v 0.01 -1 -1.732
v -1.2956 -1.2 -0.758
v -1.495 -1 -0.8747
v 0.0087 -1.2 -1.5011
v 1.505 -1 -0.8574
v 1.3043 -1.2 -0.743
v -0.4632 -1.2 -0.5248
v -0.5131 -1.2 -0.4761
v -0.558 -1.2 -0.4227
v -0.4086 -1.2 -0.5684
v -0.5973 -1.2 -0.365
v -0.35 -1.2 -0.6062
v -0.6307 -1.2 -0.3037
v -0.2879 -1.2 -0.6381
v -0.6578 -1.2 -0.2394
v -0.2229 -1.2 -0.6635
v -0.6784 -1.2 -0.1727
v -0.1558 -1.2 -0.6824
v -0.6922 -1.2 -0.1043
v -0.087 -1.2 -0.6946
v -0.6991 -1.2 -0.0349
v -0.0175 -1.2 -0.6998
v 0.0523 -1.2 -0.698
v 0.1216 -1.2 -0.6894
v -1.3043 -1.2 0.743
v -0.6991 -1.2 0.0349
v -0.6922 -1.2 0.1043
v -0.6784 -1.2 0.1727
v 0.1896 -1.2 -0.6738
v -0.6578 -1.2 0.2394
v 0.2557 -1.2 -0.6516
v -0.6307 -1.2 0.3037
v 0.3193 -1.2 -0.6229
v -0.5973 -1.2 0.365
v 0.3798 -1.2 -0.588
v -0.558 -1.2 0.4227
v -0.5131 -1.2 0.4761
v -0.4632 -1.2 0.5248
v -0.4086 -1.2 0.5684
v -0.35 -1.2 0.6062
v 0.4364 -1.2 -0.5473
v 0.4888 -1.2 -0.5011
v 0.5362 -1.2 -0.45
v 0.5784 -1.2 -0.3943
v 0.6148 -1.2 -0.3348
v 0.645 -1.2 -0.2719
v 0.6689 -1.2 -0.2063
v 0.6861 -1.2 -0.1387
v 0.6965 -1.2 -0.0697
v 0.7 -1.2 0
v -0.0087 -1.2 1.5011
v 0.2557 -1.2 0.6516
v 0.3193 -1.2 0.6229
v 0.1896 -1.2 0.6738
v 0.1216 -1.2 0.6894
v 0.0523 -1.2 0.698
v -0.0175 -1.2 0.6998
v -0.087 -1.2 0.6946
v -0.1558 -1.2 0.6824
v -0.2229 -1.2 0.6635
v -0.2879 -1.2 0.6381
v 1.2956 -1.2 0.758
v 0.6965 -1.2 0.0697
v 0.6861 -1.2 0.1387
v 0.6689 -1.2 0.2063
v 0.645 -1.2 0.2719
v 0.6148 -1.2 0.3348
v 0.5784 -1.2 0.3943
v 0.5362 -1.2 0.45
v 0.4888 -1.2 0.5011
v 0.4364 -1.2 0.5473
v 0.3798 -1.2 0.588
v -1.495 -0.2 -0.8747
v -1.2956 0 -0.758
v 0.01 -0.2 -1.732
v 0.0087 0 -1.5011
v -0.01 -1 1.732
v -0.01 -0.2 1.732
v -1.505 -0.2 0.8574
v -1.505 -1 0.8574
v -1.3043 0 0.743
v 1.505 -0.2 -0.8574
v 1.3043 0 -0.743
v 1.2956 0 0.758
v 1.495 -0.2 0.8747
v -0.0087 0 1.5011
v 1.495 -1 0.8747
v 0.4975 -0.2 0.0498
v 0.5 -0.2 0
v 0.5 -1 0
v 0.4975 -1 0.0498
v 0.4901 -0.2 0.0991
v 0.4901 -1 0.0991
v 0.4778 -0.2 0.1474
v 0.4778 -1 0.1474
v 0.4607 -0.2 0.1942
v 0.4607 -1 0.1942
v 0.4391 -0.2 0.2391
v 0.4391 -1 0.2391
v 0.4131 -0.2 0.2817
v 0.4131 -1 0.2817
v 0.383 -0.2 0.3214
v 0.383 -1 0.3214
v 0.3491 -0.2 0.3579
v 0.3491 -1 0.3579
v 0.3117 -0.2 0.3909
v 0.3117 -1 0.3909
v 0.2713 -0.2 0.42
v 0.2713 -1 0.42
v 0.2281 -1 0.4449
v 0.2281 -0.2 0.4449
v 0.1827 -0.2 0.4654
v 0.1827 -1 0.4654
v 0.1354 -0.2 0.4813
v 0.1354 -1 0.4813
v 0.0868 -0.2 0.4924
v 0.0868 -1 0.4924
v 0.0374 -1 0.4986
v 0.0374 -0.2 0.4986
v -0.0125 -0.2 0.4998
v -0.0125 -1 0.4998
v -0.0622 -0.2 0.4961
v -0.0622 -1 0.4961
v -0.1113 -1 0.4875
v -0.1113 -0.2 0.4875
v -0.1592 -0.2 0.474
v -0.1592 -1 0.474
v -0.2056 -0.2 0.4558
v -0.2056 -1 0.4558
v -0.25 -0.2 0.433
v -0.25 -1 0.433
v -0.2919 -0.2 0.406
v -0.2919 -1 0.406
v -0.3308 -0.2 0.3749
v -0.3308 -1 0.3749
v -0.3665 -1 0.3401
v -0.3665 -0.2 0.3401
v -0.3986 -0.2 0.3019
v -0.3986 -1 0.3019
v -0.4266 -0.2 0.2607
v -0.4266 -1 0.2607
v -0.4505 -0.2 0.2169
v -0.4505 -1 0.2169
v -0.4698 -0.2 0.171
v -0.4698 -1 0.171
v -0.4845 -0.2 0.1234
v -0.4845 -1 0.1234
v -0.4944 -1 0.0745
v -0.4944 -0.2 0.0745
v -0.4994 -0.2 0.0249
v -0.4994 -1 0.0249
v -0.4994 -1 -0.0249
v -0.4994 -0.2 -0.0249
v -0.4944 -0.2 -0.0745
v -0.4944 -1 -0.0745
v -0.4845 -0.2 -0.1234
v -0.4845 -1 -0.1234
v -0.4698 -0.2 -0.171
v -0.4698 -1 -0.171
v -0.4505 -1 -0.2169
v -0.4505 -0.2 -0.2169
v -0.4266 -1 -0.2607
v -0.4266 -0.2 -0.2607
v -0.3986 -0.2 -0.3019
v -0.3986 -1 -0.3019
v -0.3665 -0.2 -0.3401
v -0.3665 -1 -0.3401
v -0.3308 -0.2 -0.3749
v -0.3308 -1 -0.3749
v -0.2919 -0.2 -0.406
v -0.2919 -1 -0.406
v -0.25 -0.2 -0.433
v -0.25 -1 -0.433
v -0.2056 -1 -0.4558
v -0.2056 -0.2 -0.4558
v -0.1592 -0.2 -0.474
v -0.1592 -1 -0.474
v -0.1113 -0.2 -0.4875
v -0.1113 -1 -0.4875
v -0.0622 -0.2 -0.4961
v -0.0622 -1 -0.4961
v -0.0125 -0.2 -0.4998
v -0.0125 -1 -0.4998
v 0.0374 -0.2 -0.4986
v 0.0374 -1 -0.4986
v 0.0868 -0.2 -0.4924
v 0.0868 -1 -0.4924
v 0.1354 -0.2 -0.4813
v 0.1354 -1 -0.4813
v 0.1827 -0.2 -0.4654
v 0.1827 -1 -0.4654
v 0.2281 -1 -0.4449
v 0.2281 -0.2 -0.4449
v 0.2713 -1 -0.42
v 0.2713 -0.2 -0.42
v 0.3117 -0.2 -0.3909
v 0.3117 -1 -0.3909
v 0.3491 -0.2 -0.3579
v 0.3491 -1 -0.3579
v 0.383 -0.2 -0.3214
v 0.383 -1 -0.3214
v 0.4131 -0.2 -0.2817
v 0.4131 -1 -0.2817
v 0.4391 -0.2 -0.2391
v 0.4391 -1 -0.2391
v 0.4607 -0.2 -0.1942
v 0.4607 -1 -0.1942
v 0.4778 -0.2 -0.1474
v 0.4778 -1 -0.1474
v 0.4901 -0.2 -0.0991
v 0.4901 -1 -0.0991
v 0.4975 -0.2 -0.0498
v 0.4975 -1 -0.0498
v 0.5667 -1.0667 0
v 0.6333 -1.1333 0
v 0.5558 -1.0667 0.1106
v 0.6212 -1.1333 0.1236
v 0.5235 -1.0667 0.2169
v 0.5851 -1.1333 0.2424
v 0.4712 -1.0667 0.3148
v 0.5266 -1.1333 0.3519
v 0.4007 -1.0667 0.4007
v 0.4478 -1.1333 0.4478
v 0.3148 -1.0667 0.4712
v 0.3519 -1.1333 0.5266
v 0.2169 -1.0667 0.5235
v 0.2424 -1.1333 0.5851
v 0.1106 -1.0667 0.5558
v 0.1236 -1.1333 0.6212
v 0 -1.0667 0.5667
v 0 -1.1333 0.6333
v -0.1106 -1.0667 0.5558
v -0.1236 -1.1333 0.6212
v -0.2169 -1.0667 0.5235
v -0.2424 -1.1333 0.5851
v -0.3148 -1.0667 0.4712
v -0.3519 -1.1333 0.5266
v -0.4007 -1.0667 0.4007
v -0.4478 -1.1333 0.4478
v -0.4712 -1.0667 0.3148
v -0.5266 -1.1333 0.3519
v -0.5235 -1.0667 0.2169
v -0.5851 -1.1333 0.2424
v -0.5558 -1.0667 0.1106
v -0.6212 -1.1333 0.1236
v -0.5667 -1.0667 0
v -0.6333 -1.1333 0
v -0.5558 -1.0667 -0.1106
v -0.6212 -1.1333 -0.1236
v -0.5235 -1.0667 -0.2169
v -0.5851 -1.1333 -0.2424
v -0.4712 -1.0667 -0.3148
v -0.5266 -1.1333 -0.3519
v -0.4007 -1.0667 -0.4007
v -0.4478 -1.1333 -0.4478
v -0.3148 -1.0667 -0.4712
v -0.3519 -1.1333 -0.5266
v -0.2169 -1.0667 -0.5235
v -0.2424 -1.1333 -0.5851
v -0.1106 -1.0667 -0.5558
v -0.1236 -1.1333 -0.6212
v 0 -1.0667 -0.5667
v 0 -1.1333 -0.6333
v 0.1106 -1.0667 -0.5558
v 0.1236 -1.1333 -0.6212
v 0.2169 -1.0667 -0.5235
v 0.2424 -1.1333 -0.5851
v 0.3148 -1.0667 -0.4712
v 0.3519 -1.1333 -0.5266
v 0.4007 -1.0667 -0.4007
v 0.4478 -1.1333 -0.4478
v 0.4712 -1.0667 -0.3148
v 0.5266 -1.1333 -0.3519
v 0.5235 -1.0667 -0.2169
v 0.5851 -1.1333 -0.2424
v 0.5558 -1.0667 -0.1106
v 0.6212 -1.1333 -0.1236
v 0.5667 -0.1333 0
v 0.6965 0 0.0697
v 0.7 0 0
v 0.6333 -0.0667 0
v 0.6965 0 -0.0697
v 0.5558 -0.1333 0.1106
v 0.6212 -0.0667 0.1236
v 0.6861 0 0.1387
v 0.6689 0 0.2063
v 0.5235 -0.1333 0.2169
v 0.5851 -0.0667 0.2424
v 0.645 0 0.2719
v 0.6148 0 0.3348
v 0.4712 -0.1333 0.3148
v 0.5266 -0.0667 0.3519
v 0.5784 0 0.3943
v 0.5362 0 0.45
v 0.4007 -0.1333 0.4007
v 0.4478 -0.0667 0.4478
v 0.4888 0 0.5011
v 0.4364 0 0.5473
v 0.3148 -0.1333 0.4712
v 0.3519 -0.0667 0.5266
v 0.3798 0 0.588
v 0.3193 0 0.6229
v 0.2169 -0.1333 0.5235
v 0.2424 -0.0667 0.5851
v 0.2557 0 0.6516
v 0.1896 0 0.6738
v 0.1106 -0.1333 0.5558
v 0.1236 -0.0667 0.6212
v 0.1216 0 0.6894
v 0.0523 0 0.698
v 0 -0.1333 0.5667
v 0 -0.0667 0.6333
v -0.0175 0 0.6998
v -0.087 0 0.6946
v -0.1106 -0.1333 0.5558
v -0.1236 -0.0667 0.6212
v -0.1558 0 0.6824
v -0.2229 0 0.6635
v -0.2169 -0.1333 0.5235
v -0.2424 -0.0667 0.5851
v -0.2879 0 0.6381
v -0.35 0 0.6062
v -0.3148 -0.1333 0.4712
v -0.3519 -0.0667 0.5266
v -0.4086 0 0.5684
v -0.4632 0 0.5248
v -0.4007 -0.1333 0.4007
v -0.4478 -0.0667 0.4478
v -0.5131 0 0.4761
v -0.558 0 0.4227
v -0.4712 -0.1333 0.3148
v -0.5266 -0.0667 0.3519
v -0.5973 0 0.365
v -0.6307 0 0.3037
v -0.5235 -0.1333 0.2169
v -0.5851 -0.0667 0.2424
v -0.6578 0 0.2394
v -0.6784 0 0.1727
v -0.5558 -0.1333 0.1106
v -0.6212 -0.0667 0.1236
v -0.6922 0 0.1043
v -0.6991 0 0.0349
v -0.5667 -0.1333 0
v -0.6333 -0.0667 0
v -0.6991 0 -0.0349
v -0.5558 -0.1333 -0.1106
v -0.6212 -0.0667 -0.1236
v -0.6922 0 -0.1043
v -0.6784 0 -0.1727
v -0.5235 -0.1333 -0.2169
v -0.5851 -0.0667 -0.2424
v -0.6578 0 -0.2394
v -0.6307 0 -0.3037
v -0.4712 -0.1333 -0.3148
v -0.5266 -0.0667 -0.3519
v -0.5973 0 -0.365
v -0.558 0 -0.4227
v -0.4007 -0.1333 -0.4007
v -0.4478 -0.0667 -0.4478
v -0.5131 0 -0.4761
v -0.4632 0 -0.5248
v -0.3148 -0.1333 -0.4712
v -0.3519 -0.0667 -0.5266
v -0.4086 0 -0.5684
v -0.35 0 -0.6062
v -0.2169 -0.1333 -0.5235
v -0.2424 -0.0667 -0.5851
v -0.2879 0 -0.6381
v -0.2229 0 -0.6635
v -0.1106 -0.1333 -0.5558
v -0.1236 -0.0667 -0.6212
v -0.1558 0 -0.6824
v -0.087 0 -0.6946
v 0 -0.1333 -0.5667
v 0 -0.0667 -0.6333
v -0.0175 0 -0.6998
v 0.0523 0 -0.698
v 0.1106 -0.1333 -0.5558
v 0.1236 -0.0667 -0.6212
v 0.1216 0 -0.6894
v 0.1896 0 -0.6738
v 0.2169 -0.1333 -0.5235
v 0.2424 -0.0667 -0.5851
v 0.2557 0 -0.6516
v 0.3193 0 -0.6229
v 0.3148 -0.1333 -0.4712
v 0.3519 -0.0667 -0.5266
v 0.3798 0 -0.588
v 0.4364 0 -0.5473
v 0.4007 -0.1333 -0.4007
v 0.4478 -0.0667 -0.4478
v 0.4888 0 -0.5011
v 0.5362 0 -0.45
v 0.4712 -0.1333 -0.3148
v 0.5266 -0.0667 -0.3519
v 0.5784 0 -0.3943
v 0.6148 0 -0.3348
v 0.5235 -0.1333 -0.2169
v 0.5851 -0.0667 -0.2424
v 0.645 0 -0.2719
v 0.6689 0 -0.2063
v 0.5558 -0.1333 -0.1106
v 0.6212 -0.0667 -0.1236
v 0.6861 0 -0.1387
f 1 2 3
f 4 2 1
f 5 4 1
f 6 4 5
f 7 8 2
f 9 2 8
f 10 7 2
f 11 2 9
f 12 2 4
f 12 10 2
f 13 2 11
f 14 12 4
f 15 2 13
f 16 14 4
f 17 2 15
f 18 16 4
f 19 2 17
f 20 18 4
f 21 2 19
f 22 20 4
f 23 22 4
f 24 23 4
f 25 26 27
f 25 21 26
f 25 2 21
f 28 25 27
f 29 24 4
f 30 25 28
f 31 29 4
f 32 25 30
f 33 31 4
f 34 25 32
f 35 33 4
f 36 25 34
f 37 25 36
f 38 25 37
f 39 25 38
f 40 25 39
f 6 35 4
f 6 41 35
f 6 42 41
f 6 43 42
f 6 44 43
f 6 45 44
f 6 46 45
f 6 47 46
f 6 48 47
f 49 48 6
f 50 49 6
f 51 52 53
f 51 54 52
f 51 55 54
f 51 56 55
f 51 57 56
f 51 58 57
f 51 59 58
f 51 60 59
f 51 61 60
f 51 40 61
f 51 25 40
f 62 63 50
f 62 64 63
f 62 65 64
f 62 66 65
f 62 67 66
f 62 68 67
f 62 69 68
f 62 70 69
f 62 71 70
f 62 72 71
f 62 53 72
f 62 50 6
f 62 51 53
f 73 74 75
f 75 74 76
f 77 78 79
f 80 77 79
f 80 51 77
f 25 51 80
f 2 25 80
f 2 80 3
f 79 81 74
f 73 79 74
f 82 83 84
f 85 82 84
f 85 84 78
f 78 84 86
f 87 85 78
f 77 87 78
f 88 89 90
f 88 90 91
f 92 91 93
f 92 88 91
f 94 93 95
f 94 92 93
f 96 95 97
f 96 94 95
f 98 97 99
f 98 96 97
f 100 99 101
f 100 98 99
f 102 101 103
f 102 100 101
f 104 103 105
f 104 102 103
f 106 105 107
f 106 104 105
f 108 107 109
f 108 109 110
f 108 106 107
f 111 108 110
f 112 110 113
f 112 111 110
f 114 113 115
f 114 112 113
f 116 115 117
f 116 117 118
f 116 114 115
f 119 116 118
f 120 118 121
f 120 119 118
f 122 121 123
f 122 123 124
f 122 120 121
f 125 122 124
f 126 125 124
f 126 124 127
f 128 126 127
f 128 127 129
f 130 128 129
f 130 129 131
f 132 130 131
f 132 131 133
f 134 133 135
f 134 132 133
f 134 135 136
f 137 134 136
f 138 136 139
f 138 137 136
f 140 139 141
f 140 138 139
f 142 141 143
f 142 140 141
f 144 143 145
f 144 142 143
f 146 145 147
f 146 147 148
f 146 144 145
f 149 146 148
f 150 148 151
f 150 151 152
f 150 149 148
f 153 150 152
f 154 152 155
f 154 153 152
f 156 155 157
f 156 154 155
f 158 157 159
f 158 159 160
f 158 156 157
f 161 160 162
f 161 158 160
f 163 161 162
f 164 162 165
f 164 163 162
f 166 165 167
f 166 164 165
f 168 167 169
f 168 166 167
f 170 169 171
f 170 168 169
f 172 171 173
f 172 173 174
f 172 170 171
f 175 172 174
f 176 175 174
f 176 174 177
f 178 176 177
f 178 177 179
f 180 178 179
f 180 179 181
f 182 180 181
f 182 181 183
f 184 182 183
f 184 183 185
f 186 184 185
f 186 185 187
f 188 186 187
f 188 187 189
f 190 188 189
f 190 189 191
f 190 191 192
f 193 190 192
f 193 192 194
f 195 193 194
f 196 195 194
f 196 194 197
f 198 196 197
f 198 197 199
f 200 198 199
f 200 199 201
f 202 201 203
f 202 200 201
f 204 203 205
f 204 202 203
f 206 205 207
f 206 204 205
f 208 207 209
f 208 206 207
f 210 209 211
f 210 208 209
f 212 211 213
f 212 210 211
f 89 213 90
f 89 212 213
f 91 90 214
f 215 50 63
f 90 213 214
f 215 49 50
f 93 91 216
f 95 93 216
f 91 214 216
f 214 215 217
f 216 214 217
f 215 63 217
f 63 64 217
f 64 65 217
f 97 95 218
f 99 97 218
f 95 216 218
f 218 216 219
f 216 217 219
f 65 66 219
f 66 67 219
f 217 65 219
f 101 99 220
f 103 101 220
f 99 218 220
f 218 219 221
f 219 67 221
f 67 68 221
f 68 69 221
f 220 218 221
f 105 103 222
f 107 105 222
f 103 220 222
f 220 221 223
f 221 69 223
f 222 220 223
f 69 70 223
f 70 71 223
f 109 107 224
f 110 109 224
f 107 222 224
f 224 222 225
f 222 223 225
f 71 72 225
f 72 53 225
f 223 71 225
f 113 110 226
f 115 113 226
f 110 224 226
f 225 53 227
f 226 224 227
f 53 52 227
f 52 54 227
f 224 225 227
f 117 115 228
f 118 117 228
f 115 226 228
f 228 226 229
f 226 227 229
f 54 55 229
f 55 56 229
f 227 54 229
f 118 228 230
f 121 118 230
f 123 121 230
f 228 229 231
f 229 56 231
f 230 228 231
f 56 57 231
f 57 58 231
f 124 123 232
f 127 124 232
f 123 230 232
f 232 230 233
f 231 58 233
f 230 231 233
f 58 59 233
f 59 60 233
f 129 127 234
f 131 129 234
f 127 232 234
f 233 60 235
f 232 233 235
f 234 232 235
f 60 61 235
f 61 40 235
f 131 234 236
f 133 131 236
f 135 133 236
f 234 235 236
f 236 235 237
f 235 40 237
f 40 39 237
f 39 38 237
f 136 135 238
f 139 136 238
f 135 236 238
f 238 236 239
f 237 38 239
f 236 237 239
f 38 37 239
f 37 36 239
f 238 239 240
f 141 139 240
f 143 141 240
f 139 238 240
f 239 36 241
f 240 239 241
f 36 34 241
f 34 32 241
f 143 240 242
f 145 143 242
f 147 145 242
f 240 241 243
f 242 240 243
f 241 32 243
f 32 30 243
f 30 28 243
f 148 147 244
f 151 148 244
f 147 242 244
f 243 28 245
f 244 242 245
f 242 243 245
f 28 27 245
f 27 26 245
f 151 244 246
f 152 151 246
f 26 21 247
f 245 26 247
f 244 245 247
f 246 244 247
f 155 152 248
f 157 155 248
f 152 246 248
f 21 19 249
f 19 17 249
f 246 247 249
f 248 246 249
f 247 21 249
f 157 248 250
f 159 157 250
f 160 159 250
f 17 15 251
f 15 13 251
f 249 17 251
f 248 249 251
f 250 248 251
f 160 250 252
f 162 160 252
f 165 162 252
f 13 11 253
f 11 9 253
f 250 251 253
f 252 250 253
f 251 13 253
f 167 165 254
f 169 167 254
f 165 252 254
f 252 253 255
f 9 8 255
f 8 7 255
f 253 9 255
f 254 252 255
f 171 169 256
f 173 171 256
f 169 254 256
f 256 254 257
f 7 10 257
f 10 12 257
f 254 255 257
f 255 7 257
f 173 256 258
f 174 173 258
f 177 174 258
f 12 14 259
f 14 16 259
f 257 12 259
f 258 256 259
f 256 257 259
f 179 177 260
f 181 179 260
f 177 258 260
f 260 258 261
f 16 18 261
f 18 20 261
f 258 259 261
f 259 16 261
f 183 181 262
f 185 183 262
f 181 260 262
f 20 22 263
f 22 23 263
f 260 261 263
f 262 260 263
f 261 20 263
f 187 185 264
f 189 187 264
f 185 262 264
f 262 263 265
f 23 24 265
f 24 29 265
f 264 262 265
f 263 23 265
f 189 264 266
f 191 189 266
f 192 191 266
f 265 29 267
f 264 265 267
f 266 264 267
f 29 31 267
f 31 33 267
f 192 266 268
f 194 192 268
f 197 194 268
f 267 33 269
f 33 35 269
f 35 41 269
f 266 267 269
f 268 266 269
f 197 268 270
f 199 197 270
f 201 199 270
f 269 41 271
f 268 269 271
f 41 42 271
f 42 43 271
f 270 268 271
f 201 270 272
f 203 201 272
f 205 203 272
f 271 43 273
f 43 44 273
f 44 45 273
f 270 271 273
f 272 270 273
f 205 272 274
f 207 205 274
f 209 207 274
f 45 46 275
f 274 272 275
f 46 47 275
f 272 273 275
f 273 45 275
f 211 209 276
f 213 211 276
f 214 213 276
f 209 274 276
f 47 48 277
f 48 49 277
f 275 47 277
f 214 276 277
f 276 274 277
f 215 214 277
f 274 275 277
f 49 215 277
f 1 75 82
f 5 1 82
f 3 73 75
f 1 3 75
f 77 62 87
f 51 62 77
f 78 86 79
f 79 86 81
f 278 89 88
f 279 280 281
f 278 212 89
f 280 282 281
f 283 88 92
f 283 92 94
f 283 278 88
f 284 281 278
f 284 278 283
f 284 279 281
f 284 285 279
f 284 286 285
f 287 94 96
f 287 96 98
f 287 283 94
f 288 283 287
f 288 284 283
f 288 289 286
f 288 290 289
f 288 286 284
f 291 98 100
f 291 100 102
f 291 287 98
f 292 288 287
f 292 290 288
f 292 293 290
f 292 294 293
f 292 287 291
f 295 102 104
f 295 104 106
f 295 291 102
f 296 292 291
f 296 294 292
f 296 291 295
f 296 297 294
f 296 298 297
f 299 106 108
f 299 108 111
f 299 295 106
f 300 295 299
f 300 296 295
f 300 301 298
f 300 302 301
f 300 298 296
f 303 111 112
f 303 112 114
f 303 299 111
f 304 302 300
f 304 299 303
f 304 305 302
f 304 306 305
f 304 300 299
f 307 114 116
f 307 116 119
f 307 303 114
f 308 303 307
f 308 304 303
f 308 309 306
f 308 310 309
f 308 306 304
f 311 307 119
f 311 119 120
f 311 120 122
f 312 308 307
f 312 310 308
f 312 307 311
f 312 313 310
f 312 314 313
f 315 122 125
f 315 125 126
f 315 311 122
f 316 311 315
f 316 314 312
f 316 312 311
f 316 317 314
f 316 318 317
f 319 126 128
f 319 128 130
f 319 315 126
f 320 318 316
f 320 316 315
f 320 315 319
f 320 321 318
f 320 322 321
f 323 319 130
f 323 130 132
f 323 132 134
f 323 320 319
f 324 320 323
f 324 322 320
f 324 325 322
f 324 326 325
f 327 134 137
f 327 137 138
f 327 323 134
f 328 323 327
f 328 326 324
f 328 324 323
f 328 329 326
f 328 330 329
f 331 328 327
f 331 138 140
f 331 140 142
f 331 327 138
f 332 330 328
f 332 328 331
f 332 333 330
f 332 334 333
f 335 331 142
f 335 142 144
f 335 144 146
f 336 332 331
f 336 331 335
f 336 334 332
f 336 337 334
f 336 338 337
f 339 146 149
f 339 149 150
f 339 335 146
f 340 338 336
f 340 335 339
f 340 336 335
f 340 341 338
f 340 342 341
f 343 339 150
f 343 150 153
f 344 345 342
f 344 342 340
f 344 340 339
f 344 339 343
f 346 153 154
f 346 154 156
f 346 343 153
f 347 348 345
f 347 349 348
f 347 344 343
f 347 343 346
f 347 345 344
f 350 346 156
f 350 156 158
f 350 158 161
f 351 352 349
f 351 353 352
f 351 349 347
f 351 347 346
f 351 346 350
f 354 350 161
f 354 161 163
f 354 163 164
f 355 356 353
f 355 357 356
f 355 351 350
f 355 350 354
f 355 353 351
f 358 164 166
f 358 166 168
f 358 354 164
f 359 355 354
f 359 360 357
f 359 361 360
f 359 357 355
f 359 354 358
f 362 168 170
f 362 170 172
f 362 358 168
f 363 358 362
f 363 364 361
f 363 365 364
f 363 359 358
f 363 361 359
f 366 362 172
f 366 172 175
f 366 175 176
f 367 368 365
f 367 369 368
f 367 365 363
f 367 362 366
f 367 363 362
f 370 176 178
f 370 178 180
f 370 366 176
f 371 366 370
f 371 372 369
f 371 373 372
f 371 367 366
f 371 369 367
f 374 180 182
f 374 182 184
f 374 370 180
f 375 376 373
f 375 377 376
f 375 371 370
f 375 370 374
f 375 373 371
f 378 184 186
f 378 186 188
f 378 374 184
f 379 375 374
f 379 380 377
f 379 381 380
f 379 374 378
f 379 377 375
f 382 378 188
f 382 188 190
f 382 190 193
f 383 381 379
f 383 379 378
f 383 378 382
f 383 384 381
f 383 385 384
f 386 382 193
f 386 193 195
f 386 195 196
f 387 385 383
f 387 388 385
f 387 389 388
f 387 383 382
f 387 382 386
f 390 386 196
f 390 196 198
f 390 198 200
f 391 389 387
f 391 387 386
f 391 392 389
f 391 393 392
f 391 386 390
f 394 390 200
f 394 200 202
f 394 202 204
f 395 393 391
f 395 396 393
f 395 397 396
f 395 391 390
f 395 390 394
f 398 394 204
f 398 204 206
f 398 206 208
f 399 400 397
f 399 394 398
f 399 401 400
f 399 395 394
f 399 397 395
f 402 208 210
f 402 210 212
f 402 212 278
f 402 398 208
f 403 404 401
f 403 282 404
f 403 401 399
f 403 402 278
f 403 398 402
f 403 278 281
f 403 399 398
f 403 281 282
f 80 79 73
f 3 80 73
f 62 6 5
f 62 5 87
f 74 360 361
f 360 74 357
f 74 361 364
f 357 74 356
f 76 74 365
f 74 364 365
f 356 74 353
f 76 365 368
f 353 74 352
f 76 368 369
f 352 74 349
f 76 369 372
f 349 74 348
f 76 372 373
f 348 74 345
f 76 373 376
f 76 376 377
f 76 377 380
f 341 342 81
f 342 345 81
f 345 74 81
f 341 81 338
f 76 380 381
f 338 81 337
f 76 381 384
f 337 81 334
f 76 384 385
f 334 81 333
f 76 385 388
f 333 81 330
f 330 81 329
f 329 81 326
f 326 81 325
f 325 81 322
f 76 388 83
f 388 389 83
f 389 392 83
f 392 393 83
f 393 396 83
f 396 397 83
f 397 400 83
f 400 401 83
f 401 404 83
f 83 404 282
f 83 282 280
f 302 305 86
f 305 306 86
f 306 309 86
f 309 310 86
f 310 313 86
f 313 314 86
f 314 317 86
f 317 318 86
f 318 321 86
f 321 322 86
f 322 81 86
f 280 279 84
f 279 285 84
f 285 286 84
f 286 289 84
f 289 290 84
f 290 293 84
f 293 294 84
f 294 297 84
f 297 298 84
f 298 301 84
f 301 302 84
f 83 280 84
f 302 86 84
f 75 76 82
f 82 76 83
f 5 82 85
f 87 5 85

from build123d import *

# Parameters (mm, degrees)
F0_R     = 0.5
F1_DEPTH = 1.2
F2_SIZE  = 0.2


with BuildPart() as f1:
    # F0 (on Front) → F1 (new body)
    with BuildSketch(Plane.XZ):
        Polygon((0.00999, -1.732022), (1.50497, -0.857359), (1.49498, 0.874663), (-0.00999, 1.732022), (-1.50497, 0.857359), (-1.49498, -0.874663), align=None)
        Circle(F0_R, mode=Mode.SUBTRACT)
    extrude(amount=F1_DEPTH)

    # F2
    f2_edges = [f1.edges().sort_by_distance(p)[0] for p in [
        (-1.499975, 0, -0.008652),
        (-0.742495, 0, -1.303342),
        (0.75748, 0, -1.294691),
        (1.499975, 0, 0.008652),
        (0.742495, 0, 1.303342),
        (-0.75748, 0, 1.294691),
        (-0.5, 0, 0),
        (-1.499975, -1.2, -0.008652),
        (-0.742495, -1.2, -1.303342),
        (0.75748, -1.2, -1.294691),
        (1.499975, -1.2, 0.008652),
        (0.742495, -1.2, 1.303342),
        (-0.75748, -1.2, 1.294691),
        (-0.5, -1.2, 0),
    ]]
    chamfer(f2_edges, length=F2_SIZE)


solid = f1.part
